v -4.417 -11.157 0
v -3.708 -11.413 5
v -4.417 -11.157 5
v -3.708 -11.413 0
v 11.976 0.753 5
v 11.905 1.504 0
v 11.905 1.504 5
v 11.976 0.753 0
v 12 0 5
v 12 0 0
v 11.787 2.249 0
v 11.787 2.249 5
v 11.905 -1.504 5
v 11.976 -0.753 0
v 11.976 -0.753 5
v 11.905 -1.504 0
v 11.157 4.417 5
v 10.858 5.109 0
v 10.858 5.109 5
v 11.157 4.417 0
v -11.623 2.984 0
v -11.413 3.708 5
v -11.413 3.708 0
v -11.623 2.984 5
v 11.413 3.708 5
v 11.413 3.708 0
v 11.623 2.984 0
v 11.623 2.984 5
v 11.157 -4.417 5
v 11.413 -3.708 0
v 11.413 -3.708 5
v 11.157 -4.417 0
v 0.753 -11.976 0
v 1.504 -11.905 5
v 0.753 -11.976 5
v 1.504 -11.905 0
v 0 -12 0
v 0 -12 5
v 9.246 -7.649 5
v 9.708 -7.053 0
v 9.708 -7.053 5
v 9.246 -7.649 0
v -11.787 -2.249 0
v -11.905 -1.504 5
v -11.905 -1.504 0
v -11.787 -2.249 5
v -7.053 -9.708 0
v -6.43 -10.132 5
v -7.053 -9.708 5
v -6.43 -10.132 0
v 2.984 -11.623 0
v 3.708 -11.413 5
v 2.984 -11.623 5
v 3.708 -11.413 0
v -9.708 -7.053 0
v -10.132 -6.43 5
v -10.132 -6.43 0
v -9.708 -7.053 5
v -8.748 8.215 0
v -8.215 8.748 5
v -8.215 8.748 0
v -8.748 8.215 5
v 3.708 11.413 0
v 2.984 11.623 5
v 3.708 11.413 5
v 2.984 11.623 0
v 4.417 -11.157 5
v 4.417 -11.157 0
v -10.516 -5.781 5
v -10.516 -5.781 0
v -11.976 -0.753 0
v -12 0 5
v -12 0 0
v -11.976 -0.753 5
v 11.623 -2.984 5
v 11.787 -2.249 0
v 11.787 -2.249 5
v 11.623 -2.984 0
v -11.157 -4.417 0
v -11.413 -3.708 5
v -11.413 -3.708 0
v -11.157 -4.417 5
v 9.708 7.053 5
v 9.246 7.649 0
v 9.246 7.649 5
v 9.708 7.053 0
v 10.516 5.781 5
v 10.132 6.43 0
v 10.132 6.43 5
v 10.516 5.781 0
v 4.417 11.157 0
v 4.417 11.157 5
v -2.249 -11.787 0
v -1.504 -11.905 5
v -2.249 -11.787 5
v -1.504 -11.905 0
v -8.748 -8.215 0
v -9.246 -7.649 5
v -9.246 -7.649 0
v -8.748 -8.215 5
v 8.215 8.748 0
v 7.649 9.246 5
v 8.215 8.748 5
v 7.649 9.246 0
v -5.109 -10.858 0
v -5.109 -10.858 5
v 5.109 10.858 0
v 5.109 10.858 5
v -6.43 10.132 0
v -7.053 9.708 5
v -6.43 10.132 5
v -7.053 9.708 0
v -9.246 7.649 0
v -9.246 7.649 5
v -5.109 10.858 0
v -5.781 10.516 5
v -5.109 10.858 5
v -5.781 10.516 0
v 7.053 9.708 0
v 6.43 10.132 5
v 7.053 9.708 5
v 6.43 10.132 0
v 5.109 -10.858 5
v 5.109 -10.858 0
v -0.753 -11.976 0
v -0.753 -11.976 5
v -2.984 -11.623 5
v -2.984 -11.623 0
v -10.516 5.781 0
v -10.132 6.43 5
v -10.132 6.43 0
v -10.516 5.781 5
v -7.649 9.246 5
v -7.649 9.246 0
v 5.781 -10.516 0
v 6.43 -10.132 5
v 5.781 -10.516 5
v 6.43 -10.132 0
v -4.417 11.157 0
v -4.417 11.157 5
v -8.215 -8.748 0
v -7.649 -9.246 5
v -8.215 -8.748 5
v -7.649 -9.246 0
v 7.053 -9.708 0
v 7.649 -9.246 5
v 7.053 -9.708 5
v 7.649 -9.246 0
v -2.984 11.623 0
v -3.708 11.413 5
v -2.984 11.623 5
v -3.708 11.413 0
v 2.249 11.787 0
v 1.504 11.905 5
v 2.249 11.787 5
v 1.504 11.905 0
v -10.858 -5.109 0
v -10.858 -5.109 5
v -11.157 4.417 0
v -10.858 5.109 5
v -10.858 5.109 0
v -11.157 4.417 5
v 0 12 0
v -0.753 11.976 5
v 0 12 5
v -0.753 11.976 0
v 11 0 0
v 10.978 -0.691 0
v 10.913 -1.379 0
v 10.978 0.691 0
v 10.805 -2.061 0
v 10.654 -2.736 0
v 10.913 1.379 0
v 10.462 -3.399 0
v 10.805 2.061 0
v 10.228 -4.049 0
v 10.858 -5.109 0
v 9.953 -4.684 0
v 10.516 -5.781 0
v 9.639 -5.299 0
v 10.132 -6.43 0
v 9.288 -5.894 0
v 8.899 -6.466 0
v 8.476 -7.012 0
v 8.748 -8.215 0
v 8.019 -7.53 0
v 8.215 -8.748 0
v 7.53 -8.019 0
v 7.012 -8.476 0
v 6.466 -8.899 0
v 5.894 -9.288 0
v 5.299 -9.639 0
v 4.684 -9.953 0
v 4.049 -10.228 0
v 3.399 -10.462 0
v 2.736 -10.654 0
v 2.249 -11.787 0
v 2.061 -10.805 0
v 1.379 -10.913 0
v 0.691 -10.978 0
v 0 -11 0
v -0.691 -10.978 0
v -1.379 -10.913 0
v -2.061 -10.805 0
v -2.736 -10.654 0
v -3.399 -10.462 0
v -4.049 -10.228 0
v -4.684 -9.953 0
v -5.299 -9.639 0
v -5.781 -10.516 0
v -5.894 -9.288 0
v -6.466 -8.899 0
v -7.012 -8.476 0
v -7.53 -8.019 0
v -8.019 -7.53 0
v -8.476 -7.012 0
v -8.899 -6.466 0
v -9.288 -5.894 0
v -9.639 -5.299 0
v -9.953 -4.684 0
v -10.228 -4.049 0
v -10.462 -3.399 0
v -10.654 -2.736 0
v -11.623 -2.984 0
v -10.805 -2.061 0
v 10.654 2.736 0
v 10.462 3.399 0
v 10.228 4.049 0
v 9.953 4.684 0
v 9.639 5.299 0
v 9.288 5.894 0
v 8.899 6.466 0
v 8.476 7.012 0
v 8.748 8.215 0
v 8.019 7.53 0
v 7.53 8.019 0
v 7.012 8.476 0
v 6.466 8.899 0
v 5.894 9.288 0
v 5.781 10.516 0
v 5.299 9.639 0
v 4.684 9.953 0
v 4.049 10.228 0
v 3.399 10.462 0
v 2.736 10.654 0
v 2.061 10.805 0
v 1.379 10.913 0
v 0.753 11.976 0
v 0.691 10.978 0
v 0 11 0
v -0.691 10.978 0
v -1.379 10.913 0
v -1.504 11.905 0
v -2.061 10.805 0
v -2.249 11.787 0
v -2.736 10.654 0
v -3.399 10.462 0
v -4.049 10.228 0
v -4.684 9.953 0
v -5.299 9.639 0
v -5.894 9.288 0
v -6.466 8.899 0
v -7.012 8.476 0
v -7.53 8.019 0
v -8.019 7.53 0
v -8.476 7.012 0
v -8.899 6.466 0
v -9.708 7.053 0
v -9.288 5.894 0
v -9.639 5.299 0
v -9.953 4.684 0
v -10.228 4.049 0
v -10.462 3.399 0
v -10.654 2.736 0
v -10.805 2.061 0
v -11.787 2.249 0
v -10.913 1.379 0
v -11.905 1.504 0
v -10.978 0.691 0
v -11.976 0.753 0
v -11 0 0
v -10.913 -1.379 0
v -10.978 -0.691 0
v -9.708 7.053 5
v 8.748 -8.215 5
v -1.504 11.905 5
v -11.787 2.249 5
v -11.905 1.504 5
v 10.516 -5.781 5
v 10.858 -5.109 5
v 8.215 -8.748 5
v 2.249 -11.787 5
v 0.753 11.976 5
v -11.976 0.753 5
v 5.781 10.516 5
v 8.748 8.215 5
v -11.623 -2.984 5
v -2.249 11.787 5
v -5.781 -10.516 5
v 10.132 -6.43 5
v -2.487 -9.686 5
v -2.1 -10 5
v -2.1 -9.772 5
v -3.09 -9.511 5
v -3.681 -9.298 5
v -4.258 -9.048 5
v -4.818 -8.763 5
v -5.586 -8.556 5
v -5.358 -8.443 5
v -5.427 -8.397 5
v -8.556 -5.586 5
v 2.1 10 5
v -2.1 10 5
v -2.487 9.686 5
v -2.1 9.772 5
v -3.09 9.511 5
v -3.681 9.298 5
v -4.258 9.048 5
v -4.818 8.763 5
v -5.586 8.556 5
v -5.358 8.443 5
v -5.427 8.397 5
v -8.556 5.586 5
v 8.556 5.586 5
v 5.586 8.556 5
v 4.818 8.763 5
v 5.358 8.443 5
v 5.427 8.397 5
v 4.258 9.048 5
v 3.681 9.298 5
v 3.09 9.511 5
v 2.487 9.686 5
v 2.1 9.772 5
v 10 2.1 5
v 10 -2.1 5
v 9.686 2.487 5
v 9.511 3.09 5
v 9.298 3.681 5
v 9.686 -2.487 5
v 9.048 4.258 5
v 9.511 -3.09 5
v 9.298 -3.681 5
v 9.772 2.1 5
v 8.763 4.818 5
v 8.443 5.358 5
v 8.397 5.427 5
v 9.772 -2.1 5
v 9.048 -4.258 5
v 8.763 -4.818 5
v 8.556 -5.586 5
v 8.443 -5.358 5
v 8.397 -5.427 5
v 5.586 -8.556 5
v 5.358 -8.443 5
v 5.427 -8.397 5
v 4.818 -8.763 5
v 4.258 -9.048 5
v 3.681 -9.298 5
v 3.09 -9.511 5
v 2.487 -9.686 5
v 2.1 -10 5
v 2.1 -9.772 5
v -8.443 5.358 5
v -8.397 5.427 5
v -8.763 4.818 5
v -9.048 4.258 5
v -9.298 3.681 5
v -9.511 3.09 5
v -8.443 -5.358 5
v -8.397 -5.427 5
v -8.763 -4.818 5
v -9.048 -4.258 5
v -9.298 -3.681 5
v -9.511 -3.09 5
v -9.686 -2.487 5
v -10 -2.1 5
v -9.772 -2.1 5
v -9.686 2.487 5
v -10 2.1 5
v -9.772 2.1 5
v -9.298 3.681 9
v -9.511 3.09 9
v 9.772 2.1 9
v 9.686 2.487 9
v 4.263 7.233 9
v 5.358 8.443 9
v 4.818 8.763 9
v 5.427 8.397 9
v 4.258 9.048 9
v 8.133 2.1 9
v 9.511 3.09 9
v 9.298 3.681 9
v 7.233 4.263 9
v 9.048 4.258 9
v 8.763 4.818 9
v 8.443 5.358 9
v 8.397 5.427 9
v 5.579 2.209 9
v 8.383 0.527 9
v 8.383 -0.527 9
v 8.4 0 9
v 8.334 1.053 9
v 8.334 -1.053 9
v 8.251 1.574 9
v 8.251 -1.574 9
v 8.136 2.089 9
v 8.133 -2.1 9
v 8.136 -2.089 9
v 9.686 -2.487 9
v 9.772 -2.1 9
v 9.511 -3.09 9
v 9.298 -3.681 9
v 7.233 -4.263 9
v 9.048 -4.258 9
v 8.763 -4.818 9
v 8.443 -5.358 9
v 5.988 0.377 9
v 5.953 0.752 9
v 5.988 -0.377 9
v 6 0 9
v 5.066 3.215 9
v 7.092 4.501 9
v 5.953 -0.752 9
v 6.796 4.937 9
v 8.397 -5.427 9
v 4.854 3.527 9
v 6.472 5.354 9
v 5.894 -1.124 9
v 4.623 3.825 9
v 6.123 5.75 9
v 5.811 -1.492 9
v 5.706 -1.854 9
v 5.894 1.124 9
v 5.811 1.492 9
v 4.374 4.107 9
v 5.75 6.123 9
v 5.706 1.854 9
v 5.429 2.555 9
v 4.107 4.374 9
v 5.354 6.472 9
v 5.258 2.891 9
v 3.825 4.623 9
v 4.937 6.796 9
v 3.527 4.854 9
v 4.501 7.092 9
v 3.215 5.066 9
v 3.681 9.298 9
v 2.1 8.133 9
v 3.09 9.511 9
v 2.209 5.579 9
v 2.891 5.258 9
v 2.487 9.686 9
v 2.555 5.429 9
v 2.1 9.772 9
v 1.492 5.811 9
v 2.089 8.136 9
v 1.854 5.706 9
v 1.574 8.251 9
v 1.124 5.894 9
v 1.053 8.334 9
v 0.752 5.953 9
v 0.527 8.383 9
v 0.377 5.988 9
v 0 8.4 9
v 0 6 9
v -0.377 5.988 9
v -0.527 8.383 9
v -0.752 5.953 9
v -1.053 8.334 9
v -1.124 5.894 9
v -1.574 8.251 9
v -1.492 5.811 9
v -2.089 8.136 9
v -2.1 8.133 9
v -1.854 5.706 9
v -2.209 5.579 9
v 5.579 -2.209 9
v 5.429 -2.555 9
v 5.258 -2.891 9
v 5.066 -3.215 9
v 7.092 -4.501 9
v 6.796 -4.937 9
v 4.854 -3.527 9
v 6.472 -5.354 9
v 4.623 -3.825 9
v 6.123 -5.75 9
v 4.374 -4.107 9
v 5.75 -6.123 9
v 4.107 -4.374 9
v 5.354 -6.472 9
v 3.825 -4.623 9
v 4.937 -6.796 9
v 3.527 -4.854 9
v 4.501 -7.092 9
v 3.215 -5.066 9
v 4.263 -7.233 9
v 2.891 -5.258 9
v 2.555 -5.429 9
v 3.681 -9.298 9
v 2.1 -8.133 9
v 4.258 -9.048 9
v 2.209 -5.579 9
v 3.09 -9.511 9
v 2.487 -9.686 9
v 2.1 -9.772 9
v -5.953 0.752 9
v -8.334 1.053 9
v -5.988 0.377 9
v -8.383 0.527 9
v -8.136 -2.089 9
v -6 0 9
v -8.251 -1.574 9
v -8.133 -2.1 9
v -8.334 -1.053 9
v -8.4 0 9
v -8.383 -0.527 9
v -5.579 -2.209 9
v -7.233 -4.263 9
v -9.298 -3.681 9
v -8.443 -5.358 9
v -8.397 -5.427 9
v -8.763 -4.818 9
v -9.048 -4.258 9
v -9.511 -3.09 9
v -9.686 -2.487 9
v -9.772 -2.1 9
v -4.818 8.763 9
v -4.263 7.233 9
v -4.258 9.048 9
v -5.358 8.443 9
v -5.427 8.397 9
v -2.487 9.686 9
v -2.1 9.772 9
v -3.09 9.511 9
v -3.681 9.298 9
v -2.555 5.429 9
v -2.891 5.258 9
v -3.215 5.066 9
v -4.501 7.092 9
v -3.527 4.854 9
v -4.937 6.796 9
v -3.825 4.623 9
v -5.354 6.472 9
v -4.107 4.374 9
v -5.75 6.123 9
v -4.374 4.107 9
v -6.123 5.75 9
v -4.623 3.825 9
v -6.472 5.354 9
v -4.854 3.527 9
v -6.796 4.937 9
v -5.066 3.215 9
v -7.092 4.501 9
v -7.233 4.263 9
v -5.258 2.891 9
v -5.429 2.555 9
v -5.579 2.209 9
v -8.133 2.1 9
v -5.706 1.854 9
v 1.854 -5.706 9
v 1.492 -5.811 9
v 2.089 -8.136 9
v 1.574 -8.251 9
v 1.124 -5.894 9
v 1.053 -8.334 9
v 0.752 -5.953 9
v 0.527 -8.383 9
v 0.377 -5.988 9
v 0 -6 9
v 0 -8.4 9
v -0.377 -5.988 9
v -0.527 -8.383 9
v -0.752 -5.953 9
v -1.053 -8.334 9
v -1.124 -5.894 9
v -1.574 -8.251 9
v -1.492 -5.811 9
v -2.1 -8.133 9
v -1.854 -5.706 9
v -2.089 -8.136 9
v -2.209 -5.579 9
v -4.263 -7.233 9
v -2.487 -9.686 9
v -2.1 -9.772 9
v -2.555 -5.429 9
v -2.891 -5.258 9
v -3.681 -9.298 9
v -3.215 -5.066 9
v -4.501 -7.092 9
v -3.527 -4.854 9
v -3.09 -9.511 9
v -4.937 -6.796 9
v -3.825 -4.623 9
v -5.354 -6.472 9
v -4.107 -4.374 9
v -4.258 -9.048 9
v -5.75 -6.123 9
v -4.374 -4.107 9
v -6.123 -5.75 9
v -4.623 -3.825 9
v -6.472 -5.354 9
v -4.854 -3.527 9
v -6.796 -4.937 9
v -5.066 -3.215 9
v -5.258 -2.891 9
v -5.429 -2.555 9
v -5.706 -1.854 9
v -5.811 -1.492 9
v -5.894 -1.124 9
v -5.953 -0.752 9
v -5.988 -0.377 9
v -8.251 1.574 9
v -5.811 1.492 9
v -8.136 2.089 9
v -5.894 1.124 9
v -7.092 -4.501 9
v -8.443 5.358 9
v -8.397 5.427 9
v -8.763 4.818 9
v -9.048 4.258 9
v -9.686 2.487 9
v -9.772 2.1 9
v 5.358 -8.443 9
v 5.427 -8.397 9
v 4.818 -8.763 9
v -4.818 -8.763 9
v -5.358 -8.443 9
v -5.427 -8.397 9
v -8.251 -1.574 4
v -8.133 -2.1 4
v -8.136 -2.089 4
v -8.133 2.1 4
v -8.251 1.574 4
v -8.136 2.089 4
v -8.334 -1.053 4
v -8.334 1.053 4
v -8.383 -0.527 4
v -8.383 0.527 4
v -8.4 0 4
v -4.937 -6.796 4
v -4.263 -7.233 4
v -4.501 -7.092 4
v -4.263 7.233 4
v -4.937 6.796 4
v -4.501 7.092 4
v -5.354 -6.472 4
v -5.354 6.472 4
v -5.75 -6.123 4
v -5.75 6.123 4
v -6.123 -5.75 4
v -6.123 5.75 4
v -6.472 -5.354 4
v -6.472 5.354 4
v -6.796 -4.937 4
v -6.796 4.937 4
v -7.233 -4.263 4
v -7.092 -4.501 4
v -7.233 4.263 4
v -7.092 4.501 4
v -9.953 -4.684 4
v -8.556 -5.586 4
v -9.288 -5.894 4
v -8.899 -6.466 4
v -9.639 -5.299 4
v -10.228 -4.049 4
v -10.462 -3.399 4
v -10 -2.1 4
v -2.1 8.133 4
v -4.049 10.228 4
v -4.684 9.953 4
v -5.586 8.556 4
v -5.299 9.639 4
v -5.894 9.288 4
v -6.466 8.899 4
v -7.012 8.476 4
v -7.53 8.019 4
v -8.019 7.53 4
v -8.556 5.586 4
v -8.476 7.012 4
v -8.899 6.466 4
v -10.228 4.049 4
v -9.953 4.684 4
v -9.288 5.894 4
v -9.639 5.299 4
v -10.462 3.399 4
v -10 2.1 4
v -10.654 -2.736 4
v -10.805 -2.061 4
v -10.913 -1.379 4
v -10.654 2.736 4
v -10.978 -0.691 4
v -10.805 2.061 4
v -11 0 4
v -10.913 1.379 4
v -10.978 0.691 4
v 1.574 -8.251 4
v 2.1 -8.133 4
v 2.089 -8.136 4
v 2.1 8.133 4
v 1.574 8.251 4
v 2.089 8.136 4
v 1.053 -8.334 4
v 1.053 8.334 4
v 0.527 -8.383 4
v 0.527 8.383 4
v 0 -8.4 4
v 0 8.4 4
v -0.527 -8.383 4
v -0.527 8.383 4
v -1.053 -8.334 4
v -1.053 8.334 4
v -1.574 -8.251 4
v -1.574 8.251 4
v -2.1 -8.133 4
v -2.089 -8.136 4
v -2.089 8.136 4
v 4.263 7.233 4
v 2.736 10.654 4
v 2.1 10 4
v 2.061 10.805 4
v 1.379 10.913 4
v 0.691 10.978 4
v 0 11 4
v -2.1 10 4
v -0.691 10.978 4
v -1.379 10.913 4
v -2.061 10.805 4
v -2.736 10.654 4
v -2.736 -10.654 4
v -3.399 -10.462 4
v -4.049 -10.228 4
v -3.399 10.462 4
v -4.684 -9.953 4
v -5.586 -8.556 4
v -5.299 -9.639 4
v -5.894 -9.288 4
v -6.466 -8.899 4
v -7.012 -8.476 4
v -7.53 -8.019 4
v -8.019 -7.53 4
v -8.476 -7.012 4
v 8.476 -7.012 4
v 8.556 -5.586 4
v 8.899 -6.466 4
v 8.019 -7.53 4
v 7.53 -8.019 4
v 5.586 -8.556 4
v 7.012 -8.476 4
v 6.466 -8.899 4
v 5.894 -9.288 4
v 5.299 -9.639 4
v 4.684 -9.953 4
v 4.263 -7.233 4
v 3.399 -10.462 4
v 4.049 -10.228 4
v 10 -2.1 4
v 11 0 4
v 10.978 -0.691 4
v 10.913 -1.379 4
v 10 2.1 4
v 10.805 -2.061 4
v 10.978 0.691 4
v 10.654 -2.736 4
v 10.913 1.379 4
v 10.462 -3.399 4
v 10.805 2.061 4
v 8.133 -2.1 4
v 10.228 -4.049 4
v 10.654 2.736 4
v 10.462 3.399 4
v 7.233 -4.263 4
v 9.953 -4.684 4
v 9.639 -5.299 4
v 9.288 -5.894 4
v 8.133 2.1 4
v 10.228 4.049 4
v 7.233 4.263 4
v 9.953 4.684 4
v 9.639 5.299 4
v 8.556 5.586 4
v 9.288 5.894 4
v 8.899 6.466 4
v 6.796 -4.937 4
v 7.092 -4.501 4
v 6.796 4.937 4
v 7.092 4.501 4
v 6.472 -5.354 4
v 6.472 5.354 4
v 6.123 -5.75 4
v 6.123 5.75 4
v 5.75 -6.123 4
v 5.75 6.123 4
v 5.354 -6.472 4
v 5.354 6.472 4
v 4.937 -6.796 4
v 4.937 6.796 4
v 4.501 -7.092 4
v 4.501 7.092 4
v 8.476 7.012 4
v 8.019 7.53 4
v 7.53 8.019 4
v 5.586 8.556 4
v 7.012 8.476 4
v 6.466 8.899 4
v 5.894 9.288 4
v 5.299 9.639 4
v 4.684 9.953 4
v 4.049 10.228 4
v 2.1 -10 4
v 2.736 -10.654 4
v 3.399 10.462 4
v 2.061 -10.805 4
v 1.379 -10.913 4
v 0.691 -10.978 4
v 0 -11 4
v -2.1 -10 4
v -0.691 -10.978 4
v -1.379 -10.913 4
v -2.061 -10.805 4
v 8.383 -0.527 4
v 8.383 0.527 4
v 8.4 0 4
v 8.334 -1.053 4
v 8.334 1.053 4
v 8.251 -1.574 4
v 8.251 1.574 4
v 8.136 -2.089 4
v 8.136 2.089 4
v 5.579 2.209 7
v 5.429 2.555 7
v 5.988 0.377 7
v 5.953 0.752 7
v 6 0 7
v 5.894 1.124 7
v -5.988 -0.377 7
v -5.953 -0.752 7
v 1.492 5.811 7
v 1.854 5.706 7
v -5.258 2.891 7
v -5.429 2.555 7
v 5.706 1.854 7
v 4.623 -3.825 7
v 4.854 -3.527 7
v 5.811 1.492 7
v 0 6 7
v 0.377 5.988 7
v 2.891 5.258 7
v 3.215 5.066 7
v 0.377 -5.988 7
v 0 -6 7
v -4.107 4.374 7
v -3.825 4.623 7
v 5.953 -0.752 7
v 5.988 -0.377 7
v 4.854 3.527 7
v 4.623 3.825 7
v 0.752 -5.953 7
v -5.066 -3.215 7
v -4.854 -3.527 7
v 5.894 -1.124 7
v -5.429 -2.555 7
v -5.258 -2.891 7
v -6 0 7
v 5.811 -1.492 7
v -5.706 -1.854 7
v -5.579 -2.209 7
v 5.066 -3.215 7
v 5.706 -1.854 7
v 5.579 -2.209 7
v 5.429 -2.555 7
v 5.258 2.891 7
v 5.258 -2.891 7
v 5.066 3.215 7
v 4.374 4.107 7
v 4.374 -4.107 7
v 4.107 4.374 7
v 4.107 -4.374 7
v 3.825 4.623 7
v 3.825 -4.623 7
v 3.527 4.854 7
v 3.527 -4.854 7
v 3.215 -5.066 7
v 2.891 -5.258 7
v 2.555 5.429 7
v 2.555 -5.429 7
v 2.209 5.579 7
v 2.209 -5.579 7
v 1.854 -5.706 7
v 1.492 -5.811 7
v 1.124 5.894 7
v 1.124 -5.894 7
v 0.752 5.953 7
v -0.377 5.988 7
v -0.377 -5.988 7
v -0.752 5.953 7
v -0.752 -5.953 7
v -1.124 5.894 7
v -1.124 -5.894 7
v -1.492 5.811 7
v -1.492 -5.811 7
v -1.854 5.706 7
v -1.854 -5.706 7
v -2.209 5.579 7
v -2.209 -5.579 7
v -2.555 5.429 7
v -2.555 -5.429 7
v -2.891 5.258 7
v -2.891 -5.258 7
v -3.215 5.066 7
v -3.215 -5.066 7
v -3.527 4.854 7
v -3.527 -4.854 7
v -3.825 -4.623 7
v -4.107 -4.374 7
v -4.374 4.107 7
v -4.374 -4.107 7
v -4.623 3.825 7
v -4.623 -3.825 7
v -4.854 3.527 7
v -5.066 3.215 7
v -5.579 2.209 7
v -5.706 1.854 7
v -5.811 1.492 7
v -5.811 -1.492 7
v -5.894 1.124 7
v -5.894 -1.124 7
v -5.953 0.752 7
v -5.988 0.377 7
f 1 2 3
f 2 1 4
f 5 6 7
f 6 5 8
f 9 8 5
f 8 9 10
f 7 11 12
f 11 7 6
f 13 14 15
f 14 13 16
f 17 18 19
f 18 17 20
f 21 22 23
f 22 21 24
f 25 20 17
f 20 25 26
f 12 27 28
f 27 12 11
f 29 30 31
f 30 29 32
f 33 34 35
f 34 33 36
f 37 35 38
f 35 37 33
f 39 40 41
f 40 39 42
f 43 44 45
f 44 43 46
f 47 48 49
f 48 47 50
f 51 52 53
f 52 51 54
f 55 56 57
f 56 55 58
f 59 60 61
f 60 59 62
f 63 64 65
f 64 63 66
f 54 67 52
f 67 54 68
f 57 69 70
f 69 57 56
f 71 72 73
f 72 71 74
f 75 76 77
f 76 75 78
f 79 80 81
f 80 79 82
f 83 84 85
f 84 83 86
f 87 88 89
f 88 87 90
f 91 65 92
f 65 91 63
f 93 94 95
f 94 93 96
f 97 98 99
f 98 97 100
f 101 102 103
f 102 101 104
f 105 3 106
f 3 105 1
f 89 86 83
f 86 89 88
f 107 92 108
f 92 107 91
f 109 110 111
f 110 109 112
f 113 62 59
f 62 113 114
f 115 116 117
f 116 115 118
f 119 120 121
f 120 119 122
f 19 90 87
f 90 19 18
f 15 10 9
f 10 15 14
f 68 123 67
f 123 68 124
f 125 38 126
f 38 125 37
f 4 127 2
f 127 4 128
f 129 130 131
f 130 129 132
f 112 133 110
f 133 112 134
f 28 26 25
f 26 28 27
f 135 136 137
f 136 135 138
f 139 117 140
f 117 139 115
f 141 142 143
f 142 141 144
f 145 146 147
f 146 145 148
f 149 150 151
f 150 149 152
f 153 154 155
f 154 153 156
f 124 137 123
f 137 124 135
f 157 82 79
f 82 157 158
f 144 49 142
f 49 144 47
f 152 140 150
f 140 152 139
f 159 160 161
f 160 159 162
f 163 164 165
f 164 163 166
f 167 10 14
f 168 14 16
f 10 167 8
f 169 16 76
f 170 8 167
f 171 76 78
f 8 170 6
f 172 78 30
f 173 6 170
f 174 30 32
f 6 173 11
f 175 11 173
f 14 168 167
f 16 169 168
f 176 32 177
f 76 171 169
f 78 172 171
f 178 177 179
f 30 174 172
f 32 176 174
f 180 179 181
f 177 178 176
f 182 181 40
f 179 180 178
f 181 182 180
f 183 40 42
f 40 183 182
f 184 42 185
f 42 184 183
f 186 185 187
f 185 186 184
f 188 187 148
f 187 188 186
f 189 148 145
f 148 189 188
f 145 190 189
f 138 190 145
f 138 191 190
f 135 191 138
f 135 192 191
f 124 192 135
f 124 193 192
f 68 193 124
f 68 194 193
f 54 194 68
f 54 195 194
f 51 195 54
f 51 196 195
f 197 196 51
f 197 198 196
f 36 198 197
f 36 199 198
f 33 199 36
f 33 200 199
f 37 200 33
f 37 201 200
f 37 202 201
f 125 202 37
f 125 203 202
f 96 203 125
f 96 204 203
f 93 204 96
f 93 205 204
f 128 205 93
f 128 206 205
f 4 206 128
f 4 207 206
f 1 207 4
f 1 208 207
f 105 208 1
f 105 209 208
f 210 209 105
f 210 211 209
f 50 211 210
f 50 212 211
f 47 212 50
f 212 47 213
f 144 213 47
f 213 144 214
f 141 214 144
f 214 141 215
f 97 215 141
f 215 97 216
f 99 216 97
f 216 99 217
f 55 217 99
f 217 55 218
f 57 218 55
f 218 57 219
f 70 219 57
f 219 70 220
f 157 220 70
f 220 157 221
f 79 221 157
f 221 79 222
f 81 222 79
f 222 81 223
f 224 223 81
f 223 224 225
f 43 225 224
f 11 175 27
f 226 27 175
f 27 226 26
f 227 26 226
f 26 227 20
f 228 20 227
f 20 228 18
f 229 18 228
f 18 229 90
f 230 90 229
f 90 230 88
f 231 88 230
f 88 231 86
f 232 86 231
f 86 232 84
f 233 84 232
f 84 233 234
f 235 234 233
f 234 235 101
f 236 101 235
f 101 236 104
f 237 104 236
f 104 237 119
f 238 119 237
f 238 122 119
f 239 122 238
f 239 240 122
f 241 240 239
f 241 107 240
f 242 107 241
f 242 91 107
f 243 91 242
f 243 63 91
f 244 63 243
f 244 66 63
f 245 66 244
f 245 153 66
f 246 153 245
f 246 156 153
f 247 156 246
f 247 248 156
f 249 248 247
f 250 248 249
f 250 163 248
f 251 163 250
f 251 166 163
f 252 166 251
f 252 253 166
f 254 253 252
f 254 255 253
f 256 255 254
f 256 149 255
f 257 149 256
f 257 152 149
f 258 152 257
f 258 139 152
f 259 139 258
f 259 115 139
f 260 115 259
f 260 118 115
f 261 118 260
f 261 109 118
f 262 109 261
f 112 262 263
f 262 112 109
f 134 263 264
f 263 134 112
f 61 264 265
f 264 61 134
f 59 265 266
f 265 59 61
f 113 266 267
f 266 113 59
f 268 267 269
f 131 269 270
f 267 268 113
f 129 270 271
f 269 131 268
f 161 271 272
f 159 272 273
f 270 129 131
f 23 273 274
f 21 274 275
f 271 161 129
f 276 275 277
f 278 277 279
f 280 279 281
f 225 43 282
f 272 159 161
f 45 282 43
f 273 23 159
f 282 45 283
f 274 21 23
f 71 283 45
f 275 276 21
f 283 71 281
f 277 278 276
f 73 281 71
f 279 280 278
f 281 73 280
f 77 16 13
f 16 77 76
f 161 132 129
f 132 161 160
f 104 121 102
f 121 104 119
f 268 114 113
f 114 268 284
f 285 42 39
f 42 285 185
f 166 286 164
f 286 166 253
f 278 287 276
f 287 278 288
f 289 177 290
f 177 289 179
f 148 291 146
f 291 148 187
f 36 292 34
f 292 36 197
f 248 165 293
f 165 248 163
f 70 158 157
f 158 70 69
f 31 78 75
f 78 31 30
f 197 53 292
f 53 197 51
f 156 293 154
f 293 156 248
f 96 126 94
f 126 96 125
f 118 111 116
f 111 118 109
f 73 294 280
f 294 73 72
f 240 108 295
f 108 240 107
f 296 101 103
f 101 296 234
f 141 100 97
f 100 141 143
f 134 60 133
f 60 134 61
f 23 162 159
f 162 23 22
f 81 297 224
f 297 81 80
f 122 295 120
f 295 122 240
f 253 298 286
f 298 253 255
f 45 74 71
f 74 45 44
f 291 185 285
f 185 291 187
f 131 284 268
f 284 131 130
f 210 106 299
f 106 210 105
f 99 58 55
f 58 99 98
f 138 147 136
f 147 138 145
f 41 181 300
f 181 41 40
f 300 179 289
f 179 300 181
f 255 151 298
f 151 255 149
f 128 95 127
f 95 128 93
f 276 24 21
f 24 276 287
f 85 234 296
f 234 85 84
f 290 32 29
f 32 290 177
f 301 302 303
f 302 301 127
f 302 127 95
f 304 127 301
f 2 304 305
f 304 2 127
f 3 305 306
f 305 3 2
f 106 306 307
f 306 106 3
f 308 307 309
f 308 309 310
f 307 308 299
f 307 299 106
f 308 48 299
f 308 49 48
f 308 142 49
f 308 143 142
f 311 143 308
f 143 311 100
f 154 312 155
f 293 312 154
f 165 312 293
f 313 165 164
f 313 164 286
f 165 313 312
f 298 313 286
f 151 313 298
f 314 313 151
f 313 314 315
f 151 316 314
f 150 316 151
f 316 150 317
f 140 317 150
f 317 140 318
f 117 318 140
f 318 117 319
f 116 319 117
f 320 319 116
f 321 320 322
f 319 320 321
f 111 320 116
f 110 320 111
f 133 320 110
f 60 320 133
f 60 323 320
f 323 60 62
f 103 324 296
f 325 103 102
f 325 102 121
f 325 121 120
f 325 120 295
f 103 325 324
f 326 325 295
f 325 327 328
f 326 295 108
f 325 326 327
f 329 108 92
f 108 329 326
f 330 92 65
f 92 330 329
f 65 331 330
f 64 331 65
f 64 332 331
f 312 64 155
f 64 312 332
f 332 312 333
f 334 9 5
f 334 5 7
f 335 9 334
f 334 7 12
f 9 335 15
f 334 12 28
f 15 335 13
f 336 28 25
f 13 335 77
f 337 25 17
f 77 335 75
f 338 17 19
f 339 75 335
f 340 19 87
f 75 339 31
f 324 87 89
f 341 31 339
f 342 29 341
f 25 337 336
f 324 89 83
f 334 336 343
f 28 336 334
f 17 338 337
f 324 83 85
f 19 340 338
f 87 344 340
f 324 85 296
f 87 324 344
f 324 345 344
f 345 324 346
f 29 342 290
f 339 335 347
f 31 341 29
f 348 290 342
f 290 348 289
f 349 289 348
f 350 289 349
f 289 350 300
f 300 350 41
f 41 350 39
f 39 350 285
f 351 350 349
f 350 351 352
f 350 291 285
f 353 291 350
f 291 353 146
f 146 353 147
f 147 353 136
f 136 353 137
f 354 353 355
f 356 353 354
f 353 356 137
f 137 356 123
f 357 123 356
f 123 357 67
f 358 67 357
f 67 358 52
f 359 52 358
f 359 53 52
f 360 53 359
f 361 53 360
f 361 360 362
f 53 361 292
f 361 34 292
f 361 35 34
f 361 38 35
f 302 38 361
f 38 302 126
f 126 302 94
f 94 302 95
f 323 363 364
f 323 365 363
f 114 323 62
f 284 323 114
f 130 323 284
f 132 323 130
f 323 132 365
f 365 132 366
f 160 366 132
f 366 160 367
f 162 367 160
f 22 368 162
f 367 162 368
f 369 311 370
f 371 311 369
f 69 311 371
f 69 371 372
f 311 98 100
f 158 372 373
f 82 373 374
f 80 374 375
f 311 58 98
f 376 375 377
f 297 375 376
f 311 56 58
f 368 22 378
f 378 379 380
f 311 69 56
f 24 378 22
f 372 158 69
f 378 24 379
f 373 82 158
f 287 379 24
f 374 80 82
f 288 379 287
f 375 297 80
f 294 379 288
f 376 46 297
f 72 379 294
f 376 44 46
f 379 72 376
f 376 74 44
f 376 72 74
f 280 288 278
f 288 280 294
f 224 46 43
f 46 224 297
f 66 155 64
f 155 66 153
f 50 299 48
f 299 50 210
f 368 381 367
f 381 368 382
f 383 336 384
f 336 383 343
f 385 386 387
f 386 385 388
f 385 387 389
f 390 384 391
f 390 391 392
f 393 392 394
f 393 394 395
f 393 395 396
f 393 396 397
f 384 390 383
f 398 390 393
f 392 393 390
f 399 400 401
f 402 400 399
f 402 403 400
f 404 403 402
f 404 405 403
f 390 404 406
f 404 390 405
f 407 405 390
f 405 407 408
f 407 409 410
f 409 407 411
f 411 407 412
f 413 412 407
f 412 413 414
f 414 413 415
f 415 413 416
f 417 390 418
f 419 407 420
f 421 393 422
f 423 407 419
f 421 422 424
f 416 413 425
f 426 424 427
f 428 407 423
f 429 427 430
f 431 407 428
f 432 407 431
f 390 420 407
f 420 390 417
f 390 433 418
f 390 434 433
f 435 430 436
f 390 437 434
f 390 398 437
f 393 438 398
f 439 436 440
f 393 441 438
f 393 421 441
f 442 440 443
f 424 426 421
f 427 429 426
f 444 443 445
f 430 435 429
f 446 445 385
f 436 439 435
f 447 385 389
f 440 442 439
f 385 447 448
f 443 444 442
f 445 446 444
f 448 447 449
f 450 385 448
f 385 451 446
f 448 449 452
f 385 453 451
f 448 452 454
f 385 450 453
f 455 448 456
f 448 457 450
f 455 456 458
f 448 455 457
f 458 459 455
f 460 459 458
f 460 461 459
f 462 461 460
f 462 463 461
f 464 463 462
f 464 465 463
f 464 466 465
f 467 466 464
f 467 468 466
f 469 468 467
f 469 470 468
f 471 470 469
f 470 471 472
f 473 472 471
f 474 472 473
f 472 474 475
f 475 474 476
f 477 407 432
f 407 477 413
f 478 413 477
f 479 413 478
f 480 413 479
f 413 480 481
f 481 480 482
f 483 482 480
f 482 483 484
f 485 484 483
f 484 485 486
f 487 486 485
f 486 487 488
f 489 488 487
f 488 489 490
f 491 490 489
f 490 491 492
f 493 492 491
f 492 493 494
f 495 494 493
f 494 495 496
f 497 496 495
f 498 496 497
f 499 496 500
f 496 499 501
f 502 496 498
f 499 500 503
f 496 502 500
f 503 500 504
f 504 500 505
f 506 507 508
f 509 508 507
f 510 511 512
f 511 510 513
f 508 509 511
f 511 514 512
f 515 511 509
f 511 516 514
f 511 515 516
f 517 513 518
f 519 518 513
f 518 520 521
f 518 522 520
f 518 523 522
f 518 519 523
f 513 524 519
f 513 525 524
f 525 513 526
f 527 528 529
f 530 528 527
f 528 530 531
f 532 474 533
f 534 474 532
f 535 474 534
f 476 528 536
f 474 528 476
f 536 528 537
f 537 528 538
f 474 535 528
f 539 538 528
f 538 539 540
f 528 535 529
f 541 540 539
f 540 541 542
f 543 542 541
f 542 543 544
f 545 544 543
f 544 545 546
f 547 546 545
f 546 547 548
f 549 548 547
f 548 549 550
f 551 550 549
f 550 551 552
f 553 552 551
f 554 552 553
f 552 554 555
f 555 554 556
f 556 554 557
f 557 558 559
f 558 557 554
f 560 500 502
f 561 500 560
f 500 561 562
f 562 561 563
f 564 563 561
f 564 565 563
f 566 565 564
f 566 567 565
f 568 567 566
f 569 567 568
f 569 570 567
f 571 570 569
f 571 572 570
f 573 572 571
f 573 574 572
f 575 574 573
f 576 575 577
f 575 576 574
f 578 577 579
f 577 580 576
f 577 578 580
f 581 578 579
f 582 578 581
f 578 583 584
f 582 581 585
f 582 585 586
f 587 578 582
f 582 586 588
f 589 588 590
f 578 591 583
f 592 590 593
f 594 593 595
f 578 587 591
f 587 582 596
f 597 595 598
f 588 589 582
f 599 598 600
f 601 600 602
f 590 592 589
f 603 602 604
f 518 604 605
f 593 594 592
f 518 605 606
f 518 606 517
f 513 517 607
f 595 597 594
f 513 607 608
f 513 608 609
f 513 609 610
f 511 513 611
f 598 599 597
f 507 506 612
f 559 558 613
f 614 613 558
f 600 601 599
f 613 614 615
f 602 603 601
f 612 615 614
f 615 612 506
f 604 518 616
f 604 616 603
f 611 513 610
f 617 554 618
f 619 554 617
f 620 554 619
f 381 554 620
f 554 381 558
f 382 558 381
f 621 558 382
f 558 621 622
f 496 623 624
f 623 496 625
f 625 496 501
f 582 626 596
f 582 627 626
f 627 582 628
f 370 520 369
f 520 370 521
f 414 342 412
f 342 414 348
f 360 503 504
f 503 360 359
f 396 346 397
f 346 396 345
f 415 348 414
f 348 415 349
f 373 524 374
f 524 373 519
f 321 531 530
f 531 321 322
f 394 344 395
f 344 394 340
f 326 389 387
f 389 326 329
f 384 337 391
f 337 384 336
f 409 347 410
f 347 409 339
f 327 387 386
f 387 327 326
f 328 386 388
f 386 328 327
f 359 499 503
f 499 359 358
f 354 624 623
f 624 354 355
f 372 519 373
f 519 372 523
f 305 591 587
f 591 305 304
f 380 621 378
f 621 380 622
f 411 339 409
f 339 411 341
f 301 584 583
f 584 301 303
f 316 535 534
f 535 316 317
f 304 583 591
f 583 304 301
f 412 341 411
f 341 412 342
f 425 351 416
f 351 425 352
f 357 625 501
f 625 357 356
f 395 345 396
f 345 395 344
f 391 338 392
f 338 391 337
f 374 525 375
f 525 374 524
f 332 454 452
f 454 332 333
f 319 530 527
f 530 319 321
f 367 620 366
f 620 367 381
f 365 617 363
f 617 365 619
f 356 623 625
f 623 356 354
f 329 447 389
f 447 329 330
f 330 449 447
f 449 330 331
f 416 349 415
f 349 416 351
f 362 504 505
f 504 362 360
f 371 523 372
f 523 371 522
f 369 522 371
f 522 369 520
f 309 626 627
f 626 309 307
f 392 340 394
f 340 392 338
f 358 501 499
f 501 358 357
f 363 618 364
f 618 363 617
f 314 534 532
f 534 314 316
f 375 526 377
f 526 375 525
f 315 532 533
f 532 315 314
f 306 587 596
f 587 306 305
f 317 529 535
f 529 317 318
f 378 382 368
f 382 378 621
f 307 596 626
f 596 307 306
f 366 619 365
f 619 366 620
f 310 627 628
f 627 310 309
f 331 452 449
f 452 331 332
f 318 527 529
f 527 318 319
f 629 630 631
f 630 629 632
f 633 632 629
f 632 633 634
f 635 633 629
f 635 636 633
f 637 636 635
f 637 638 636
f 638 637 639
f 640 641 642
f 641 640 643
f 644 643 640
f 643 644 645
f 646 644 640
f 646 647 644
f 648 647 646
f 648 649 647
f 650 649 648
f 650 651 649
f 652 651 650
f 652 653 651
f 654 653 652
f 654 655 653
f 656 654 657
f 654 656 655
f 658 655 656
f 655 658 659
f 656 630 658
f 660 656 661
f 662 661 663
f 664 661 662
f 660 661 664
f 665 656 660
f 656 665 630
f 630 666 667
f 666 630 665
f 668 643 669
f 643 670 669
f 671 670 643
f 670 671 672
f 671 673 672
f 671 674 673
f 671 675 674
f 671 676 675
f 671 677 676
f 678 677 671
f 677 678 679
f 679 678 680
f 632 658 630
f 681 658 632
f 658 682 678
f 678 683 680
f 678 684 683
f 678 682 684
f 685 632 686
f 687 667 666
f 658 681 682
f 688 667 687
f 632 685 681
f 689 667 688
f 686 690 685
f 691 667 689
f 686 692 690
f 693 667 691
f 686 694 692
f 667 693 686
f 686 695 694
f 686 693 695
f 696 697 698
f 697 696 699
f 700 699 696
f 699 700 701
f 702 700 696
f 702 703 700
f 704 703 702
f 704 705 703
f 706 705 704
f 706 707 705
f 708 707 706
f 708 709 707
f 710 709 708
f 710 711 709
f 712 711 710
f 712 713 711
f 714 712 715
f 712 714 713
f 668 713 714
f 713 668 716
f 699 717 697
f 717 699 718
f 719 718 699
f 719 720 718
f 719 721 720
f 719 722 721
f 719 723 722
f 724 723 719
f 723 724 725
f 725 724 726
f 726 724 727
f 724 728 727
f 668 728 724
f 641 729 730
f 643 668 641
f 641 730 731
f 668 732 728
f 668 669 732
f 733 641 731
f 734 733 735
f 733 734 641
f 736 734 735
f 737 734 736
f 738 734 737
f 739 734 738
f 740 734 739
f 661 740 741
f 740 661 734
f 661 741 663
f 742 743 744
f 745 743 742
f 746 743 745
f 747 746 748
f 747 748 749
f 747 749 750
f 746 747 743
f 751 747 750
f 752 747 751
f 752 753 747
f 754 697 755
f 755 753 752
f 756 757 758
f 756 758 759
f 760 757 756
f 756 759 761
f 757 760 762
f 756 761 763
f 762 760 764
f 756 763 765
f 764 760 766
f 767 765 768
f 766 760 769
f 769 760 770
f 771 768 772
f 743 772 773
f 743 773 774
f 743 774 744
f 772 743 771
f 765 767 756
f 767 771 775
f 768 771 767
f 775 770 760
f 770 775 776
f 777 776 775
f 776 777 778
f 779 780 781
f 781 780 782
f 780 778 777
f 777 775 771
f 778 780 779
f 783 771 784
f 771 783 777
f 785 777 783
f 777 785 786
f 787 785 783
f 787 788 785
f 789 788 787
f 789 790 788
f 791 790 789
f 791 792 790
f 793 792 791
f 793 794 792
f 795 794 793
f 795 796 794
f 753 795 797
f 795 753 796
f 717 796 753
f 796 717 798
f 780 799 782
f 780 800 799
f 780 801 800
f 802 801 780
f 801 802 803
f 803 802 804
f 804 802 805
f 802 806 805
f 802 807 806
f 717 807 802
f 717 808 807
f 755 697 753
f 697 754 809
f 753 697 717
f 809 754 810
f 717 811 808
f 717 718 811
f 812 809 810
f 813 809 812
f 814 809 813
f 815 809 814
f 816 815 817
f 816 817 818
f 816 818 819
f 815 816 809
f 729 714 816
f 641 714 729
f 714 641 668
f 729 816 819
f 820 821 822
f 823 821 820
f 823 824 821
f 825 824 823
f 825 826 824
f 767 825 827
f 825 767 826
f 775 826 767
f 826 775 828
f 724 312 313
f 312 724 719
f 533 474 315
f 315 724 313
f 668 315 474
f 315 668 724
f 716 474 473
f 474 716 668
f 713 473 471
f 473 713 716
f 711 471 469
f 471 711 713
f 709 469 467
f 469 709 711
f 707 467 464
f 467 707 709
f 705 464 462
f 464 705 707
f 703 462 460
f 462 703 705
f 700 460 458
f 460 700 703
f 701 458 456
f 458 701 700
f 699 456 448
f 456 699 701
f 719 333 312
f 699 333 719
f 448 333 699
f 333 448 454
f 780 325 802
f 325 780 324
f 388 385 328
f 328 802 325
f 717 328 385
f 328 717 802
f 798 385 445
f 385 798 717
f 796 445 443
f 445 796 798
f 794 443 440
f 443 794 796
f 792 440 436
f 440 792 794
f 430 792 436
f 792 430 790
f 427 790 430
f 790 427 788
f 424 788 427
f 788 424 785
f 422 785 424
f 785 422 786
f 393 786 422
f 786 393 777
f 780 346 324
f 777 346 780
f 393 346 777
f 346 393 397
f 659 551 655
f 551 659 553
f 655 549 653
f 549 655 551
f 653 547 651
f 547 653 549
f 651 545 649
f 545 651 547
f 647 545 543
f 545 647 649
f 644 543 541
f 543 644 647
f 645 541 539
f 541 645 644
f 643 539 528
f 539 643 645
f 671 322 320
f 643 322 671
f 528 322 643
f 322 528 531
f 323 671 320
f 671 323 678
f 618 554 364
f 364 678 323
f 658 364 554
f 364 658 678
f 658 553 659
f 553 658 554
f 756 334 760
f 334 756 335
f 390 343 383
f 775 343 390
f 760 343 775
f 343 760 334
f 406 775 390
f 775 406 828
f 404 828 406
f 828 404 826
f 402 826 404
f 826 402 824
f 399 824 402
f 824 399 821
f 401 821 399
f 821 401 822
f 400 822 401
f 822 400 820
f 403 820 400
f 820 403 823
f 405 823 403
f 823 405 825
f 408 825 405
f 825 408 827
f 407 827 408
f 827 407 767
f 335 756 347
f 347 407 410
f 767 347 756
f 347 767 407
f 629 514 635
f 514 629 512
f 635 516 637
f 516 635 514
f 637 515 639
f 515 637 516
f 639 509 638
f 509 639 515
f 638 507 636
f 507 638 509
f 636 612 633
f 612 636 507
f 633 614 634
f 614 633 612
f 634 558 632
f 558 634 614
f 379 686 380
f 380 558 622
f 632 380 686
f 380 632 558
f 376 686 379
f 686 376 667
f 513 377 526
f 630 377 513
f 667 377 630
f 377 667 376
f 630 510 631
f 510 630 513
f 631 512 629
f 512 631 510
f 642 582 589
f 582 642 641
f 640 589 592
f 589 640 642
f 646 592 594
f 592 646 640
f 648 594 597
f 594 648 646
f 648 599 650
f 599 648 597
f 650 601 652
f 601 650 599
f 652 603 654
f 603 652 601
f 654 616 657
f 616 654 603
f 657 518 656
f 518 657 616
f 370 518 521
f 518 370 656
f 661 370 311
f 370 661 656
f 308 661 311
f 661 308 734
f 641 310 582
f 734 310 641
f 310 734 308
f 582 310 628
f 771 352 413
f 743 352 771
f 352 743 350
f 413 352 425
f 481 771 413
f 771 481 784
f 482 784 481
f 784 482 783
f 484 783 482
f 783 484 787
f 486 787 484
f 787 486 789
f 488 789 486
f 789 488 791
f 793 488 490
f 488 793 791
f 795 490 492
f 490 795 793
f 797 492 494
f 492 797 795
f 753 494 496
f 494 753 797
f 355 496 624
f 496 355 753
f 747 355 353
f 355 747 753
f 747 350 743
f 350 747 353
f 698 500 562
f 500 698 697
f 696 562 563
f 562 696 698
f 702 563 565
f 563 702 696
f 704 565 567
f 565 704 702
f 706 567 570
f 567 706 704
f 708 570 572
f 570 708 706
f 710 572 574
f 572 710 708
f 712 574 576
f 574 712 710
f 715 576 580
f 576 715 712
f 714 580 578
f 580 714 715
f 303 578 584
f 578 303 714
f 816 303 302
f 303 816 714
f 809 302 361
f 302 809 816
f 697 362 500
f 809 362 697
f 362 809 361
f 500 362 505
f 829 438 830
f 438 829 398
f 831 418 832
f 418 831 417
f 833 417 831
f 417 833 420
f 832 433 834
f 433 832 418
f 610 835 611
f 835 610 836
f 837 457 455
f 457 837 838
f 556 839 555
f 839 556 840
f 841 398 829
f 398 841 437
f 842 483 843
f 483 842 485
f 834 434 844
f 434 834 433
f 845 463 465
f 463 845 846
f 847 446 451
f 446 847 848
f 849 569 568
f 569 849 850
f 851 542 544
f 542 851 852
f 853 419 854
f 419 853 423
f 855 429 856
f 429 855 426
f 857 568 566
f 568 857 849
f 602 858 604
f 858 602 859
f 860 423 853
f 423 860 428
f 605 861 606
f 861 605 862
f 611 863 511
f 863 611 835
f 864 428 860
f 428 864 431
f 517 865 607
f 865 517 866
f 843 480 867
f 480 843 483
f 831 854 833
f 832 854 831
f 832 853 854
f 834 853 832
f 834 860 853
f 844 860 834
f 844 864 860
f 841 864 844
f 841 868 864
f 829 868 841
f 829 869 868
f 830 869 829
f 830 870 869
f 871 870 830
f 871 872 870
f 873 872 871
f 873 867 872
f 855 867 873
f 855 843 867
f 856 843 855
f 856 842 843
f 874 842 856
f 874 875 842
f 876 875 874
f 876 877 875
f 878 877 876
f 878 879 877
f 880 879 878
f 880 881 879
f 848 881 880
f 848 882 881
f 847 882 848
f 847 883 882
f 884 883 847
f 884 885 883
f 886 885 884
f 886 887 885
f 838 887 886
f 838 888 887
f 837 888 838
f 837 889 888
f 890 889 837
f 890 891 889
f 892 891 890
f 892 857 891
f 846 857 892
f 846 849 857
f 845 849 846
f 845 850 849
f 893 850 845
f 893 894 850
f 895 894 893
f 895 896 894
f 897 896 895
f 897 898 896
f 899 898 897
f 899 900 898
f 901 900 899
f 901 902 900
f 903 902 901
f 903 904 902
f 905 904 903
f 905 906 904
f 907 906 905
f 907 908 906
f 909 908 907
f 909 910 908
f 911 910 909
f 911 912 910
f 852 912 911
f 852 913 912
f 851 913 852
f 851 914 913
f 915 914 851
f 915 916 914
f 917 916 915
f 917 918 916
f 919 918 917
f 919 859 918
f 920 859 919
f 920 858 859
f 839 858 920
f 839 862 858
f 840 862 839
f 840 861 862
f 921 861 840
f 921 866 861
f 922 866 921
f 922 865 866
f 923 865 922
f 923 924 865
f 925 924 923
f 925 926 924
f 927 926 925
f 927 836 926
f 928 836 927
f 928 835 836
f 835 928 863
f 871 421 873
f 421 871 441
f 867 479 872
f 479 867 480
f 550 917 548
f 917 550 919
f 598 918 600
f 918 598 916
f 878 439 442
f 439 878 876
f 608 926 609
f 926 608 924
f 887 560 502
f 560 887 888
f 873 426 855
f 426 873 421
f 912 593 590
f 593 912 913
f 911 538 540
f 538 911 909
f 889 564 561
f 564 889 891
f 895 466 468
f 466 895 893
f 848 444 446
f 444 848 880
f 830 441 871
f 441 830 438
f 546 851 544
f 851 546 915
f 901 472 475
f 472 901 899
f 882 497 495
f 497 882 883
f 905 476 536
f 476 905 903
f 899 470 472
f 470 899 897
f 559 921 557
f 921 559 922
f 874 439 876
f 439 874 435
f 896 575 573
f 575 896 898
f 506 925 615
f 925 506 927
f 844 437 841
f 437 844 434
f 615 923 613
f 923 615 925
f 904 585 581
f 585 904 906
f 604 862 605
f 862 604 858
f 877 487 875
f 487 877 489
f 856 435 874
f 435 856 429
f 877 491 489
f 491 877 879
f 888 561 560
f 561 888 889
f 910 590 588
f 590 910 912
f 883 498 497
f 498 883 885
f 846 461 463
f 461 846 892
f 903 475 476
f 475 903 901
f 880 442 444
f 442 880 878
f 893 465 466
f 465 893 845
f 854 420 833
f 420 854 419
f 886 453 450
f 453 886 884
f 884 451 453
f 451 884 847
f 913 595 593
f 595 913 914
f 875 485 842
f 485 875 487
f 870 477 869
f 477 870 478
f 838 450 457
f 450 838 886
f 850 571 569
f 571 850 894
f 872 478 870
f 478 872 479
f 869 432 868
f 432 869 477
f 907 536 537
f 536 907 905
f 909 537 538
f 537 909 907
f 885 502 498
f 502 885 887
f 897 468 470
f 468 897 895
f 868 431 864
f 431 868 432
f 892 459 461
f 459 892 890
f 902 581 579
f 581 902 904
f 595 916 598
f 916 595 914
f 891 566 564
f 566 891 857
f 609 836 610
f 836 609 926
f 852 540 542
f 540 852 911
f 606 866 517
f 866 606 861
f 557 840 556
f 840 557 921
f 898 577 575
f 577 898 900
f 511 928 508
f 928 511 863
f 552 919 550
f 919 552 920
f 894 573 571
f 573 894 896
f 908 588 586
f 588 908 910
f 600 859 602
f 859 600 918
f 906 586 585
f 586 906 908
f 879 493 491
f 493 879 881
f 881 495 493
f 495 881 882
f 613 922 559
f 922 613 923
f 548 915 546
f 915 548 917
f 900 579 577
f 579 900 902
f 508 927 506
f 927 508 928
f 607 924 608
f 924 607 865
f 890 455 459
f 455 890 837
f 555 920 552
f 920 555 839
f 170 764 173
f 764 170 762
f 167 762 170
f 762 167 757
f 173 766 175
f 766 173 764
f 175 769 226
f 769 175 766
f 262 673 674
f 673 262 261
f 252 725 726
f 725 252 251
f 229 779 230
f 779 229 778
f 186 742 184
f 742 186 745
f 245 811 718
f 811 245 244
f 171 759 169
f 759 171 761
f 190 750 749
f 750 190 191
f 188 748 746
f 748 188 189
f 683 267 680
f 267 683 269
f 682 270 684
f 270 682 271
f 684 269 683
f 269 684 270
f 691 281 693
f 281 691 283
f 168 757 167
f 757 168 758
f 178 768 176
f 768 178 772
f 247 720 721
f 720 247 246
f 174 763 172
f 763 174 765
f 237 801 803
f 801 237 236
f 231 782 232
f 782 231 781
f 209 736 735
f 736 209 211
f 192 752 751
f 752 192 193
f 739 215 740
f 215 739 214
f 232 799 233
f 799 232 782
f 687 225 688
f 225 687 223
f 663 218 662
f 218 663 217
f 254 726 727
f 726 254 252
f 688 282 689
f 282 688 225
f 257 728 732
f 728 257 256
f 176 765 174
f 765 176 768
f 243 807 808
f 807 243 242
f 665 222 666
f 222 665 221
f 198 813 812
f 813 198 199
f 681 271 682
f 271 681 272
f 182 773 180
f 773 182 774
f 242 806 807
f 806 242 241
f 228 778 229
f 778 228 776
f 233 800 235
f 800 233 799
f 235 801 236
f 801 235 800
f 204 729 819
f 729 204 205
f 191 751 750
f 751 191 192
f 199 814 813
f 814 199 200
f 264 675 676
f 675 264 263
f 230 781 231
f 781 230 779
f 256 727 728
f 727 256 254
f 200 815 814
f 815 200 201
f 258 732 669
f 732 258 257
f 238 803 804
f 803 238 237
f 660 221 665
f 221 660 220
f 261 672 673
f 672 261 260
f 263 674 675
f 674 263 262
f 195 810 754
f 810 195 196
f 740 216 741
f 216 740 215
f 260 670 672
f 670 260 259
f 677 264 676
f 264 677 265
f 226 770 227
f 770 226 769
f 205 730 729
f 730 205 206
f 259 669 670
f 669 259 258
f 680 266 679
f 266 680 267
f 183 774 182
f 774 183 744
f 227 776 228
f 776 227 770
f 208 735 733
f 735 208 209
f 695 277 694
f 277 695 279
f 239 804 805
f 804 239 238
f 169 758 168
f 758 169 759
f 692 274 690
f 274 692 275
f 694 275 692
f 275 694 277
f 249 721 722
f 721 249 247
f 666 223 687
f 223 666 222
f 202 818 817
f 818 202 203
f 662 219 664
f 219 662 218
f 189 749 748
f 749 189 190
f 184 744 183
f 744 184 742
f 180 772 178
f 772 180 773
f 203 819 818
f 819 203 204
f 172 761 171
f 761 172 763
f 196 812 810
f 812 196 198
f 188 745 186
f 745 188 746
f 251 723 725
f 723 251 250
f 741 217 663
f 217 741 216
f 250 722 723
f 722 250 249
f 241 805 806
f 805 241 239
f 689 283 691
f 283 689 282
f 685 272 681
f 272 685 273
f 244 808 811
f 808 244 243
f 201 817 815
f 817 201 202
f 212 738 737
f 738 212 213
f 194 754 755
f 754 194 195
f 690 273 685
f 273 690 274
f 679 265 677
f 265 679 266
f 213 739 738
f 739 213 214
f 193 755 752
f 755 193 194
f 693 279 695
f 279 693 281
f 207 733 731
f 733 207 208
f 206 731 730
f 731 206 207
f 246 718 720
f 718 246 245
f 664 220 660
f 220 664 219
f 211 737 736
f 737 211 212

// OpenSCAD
$fn = 100;

module sensor_places() {
  linear_extrude(7)
    difference() {
      for(angle = [0 : 45 : 135]) {
        rotate([0, 0, angle]) square([4.2, 20], center=true); 
      }
      circle(d=16.8);
    }
}


module sensor_places_2() {
  difference() {
    translate([0, 0, 2.5])
      for(angle = [0 : 45 : 135]) {
        rotate([0, 0, angle]) cube([4.2, 20, 5], center=true);
      }
    cylinder(h=5, d=16.8);
  }
}


module extracted_core() {
  translate([0, 0, 4]) sensor_places();
  translate([0, 0, 3+4]) cylinder(h=4, d=12);
  cylinder(h=4, d=22);
}


difference() {
  union() {
    cylinder(h=5, d=24);
    translate([0, 0, 4]) cylinder(h=5, d=20);
  }
  extracted_core();
}
